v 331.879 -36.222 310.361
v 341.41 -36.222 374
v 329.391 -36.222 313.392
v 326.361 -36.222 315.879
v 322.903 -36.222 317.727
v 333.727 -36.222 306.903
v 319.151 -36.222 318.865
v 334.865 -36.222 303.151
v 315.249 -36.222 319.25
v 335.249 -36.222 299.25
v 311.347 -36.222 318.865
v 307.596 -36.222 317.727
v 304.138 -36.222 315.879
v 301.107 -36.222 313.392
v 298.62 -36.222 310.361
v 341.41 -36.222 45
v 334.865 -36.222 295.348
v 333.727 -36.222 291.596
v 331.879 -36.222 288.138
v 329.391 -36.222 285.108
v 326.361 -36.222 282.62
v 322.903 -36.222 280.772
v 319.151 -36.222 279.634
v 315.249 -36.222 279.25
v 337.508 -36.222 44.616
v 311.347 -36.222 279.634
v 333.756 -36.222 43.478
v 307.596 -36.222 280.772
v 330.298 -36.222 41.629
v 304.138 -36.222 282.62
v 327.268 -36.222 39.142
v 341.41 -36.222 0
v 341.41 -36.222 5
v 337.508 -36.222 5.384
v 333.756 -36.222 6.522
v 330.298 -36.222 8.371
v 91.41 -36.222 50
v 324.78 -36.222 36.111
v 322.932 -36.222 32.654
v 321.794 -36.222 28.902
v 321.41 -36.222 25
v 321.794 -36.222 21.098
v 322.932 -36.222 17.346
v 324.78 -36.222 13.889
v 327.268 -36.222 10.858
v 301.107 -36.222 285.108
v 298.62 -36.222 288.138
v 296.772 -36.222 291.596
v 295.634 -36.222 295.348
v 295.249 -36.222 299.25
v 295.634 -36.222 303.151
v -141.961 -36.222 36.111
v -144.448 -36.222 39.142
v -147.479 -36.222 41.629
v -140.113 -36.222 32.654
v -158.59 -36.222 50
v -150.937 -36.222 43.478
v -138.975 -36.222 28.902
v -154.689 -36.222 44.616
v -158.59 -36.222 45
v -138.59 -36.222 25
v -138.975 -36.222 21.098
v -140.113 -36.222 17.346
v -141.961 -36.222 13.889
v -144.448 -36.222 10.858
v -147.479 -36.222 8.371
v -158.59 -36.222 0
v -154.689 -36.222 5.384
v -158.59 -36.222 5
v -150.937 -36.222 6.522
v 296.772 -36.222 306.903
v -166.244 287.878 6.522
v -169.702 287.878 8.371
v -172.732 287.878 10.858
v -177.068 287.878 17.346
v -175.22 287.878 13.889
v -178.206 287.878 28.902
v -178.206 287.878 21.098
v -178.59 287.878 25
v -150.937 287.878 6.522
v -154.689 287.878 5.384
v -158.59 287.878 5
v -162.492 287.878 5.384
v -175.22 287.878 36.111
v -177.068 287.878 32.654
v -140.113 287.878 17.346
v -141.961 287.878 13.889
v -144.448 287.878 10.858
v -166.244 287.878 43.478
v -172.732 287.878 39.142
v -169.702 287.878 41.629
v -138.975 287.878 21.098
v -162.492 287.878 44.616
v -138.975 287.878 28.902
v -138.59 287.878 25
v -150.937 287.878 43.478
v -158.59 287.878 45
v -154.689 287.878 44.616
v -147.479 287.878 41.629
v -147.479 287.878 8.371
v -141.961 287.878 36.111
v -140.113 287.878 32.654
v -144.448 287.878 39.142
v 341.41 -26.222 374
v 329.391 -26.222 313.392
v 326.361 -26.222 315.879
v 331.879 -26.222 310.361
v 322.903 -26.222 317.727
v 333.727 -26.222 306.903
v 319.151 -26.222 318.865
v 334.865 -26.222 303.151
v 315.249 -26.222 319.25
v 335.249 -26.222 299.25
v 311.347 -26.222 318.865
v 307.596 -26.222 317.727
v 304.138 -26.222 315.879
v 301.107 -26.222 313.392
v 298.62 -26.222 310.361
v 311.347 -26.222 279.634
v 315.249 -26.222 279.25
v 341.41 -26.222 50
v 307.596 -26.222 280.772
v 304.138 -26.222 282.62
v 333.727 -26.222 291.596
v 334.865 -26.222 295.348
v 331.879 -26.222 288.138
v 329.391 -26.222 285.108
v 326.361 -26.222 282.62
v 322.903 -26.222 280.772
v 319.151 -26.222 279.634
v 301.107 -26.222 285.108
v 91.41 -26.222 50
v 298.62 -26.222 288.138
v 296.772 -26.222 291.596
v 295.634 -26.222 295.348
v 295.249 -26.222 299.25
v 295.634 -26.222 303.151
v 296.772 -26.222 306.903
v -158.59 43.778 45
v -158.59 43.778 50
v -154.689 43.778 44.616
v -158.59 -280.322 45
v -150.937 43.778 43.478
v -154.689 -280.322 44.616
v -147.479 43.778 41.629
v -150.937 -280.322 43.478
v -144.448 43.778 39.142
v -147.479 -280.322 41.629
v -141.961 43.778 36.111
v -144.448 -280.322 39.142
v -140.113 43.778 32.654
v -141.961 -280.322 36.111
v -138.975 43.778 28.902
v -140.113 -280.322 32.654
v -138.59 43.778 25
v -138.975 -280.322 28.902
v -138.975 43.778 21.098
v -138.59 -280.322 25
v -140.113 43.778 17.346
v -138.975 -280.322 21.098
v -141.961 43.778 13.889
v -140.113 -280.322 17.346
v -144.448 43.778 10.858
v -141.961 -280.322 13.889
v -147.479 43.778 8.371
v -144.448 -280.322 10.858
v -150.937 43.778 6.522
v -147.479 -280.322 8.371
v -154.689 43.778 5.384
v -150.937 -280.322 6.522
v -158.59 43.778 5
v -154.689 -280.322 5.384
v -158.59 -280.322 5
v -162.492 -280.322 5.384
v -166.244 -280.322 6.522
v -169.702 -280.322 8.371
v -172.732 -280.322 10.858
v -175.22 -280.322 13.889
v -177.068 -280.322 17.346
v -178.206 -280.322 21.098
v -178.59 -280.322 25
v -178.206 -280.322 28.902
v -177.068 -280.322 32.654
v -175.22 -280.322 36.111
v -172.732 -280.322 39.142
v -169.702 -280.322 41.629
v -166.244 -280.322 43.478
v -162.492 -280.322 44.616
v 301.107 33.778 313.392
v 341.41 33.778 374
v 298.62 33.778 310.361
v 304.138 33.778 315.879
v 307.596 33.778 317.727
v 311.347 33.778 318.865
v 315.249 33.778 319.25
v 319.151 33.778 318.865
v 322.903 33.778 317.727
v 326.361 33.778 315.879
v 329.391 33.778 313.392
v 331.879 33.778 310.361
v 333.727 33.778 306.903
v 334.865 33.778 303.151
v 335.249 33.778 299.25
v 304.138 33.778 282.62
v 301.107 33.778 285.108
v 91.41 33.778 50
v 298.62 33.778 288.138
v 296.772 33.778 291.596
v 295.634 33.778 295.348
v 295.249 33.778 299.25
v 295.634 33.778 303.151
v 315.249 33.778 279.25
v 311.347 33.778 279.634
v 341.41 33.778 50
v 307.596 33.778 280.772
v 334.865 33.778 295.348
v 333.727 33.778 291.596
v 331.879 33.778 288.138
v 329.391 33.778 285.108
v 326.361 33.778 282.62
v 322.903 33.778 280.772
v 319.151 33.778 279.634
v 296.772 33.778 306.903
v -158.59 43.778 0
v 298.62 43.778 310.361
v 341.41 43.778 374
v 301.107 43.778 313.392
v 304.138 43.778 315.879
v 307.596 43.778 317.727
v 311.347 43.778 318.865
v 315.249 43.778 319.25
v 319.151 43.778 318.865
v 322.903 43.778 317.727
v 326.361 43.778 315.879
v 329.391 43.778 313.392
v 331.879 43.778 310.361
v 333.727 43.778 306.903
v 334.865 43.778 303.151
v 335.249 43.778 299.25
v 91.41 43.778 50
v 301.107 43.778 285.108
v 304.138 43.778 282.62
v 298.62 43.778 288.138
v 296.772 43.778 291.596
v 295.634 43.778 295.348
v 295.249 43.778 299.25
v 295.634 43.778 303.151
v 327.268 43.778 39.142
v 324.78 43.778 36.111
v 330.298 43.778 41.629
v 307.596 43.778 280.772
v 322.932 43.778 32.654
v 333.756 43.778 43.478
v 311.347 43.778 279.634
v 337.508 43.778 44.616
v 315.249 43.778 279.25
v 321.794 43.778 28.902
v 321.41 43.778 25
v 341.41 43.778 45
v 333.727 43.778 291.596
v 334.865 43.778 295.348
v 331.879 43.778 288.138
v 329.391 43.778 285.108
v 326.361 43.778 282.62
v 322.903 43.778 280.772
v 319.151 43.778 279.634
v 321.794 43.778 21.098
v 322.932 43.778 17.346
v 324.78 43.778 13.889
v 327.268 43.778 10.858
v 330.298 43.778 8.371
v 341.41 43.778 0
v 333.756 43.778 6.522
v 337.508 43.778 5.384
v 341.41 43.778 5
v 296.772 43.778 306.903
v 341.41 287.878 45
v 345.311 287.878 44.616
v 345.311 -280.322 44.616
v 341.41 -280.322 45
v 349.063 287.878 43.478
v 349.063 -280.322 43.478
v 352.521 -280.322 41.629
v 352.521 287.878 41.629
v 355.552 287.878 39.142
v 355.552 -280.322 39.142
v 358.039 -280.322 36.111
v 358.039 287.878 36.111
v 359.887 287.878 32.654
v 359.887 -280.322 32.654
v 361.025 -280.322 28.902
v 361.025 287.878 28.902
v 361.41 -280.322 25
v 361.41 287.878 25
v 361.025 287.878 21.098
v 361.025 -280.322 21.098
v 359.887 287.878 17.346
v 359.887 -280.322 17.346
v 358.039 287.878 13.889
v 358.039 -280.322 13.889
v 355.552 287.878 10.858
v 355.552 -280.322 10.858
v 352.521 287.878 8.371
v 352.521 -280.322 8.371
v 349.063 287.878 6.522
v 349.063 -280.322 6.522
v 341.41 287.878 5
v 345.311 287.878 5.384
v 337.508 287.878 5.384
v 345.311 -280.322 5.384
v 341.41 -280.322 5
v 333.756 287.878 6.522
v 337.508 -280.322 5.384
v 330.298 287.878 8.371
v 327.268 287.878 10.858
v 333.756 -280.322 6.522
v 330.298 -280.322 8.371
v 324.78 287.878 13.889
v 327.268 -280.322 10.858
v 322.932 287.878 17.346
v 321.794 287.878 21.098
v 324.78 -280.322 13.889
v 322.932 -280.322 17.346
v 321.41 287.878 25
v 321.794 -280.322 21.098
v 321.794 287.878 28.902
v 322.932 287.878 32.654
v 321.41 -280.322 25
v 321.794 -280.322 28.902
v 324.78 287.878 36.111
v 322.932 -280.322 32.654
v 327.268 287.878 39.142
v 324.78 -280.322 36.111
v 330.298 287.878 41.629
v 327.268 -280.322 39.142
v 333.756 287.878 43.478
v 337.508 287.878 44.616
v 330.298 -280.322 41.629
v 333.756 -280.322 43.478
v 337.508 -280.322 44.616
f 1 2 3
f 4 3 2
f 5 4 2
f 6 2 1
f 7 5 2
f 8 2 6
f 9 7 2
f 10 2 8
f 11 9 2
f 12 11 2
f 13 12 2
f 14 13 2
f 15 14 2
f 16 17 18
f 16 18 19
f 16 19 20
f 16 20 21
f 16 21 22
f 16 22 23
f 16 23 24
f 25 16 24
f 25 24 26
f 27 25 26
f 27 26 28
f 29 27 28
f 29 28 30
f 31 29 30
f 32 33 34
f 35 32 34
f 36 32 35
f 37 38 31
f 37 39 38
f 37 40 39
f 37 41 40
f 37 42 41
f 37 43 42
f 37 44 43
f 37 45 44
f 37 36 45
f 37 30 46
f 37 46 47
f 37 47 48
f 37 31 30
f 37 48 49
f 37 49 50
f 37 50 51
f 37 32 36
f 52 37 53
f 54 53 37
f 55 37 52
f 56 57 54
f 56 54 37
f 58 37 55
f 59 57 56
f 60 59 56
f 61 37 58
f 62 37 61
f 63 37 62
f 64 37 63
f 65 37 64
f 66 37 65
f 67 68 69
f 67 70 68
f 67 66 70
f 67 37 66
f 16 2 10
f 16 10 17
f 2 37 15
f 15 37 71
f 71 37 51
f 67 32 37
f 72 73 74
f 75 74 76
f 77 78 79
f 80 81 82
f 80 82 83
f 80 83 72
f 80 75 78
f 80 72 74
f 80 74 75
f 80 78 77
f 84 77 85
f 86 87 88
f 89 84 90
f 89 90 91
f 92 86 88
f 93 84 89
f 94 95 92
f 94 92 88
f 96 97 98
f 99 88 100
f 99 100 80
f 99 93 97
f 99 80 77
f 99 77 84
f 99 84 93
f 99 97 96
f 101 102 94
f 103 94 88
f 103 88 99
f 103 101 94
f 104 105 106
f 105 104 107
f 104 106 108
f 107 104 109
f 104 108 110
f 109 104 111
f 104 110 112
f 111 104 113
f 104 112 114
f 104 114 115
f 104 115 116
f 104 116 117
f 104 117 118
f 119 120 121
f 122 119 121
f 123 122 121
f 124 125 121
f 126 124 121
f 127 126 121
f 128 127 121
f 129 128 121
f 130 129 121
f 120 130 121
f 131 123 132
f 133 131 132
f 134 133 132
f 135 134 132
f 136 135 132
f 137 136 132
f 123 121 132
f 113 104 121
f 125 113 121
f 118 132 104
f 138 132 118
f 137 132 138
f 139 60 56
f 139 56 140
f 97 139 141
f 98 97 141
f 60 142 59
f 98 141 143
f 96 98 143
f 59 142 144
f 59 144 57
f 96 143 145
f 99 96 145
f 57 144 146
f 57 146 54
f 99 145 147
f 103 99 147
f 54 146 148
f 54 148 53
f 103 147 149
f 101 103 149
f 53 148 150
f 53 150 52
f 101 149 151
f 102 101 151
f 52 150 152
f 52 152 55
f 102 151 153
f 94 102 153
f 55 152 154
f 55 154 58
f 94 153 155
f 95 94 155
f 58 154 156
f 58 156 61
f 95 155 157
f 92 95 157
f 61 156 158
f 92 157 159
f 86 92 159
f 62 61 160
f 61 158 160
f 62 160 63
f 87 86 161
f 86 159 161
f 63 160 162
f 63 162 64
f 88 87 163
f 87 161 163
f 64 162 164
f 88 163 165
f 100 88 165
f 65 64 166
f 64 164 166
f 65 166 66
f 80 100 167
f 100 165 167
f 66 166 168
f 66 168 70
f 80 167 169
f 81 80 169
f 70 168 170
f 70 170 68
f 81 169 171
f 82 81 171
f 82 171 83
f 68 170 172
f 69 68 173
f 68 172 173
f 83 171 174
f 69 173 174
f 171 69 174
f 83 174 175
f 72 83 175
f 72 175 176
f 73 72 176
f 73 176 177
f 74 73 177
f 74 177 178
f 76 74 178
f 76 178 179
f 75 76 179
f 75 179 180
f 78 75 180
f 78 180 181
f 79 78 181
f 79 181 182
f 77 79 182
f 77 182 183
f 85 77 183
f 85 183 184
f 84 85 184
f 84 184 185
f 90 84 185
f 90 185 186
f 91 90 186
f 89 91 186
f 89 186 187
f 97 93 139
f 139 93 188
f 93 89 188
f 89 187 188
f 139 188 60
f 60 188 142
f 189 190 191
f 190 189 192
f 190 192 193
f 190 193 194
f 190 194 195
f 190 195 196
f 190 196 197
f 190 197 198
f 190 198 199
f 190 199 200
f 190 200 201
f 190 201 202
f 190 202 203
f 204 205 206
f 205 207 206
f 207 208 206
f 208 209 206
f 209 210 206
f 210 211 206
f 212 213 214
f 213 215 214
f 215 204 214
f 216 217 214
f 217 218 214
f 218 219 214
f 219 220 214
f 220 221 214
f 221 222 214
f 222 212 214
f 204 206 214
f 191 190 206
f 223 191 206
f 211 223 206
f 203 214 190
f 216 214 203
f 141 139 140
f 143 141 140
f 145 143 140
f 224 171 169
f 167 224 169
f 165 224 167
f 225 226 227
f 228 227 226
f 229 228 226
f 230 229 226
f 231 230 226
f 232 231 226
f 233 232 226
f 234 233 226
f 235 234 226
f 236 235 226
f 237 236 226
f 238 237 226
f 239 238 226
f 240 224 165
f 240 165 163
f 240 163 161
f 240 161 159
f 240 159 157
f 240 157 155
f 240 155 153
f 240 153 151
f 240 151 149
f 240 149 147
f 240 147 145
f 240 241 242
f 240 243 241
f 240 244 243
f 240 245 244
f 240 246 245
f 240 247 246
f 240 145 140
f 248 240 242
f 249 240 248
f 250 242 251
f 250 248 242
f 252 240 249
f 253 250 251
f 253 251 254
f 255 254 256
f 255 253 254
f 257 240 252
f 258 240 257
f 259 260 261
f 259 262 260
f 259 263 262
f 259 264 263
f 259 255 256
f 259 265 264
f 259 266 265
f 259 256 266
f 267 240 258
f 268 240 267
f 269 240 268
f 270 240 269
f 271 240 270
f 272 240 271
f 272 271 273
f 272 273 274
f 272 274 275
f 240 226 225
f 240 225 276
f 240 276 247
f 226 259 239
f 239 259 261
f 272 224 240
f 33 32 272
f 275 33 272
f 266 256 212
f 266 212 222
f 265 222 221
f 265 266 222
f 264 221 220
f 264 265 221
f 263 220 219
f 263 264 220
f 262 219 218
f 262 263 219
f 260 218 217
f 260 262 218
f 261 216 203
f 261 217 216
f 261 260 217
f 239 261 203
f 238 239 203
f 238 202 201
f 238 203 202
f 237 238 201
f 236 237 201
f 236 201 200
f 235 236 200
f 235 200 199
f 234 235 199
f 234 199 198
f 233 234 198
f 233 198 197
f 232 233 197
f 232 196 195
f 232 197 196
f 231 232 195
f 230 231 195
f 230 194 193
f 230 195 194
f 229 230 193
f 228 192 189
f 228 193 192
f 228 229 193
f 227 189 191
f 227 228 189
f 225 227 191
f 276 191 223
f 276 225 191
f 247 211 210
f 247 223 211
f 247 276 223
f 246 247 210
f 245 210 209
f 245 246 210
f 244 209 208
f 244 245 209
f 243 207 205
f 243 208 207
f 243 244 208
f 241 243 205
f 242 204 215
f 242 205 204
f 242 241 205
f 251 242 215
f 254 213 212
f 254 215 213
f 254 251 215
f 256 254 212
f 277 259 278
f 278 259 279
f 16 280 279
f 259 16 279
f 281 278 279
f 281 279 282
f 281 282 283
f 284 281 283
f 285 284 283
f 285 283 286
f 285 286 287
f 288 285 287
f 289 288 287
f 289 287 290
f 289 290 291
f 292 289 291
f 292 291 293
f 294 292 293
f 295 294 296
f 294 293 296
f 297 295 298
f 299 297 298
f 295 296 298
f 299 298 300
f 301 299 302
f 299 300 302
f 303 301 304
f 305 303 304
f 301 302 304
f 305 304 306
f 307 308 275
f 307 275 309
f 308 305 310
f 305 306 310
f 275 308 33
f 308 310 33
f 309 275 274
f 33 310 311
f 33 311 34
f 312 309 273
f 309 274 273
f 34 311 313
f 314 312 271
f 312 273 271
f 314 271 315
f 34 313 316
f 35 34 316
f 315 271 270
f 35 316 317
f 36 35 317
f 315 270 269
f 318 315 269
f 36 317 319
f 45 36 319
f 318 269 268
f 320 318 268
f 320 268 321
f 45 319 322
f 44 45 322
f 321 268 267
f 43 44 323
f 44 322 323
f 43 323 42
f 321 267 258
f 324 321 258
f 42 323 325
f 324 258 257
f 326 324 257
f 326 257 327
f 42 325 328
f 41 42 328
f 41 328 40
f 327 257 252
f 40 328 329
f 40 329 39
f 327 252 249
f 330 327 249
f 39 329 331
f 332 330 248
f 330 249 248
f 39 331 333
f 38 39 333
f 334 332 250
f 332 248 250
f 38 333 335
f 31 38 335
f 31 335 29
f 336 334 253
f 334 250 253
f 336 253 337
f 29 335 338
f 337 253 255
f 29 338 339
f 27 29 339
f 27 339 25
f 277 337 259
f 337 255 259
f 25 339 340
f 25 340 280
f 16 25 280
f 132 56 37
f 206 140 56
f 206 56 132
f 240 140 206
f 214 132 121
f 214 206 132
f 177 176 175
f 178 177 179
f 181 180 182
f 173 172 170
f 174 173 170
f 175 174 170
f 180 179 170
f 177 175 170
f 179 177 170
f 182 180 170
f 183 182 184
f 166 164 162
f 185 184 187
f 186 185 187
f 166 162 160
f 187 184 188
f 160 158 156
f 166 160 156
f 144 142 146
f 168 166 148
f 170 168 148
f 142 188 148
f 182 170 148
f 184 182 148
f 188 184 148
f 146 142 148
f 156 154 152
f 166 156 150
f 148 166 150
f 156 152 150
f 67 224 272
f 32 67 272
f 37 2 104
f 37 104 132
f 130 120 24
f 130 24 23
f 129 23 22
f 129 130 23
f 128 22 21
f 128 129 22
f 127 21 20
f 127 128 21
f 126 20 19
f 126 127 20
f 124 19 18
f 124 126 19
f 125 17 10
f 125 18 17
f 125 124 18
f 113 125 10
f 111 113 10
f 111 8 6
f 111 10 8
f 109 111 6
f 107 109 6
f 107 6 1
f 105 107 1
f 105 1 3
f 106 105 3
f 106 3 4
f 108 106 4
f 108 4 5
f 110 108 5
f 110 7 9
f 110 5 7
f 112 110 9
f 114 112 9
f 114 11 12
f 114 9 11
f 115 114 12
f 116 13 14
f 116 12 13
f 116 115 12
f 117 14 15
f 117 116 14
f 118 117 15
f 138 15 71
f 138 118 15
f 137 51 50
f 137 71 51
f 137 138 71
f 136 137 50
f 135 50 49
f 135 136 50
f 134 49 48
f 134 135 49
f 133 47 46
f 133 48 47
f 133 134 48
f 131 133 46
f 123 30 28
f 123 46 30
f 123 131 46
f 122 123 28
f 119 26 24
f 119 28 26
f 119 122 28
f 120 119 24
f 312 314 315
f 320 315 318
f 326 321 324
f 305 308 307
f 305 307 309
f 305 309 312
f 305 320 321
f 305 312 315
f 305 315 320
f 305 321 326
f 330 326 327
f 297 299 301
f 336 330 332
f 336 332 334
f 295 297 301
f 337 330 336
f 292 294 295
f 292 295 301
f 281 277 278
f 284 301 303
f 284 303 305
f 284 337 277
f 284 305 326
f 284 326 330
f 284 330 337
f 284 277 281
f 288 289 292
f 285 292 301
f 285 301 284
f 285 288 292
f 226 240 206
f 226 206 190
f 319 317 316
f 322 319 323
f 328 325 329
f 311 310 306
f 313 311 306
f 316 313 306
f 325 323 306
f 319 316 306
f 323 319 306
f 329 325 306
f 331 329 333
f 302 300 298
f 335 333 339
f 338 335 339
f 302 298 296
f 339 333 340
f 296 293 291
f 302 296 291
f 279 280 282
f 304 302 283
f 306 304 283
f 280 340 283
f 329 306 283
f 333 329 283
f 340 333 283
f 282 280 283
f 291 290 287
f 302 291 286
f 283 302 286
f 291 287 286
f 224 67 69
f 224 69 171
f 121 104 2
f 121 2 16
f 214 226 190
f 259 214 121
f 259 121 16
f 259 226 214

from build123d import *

# Parameters (mm, degrees)
SKETCH1_W                = 500
SKETCH1_H                = 80
BOSS_EXTRUDE1_DEPTH      = 50
BOSS_EXTRUDE2_DEPTH      = 244.1
BOSS_EXTRUDE2_DEPTH_BACK = 324.1
SKETCH2_R                = 20
BOSS_EXTRUDE5_DEPTH      = 10
BOSS_EXTRUDE6_DEPTH      = 10
CUT_EXTRUDE4_DEPTH       = 613.808106347
CUT_EXTRUDE4_DEPTH_BACK  = 613.808106347
SKETCH7_R                = 20


with BuildPart() as part:
    # Sketch1 → Boss-Extrude1 (new body)
    with BuildSketch(Plane.XY):
        with Locations((91.40969163, 3.77753304)):
            Rectangle(SKETCH1_W, SKETCH1_H)
    extrude(amount=BOSS_EXTRUDE1_DEPTH)

    # Sketch2 → Boss-Extrude2 (add, two sides: drawn at the far end of the back side and taken through both)
    with BuildSketch(Plane(origin=(0, 43.77753304, 0), x_dir=(1, 0, 0), z_dir=(0, 1, 0)).offset(-BOSS_EXTRUDE2_DEPTH_BACK)):
        with Locations(Location((-158.59030837, -25, 0), (0, 0, 270))):
            Circle(SKETCH2_R)
        with Locations(Location((341.40969163, -25, 0), (0, 0, 270))):
            Circle(SKETCH2_R)
    extrude(amount=BOSS_EXTRUDE2_DEPTH + BOSS_EXTRUDE2_DEPTH_BACK)

    # Sketch5 → Boss-Extrude5 (add)
    with BuildSketch(Plane(origin=(0, -36.22246696, 0), x_dir=(-1, 0, 0), z_dir=(0, -1, 0))):
        Polygon((-341.40969163, -50), (-341.40969163, -374), (-91.40969163, -50), align=None)
    extrude(amount=-BOSS_EXTRUDE5_DEPTH)

    # Sketch6 → Boss-Extrude6 (add)
    with BuildSketch(Plane(origin=(0, 43.77753304, 0), x_dir=(1, 0, 0), z_dir=(0, 1, 0))):
        Polygon((341.40969163, -50), (91.40969163, -50), (341.40969163, -374), align=None)
    extrude(amount=-BOSS_EXTRUDE6_DEPTH)

    # Sketch7 → Cut-Extrude4 (cut, two sides: drawn at the far end of the back side and taken through both)
    with BuildSketch(Plane(origin=(0, -36.22246696, 0), x_dir=(-1, 0, 0), z_dir=(0, -1, 0)).offset(-CUT_EXTRUDE4_DEPTH_BACK)):
        with Locations(Location((-315.24921844, -299.249641509, 0), (0, 0, 90))):
            Circle(SKETCH7_R)
    extrude(amount=CUT_EXTRUDE4_DEPTH + CUT_EXTRUDE4_DEPTH_BACK, mode=Mode.SUBTRACT)


solid = part.part
